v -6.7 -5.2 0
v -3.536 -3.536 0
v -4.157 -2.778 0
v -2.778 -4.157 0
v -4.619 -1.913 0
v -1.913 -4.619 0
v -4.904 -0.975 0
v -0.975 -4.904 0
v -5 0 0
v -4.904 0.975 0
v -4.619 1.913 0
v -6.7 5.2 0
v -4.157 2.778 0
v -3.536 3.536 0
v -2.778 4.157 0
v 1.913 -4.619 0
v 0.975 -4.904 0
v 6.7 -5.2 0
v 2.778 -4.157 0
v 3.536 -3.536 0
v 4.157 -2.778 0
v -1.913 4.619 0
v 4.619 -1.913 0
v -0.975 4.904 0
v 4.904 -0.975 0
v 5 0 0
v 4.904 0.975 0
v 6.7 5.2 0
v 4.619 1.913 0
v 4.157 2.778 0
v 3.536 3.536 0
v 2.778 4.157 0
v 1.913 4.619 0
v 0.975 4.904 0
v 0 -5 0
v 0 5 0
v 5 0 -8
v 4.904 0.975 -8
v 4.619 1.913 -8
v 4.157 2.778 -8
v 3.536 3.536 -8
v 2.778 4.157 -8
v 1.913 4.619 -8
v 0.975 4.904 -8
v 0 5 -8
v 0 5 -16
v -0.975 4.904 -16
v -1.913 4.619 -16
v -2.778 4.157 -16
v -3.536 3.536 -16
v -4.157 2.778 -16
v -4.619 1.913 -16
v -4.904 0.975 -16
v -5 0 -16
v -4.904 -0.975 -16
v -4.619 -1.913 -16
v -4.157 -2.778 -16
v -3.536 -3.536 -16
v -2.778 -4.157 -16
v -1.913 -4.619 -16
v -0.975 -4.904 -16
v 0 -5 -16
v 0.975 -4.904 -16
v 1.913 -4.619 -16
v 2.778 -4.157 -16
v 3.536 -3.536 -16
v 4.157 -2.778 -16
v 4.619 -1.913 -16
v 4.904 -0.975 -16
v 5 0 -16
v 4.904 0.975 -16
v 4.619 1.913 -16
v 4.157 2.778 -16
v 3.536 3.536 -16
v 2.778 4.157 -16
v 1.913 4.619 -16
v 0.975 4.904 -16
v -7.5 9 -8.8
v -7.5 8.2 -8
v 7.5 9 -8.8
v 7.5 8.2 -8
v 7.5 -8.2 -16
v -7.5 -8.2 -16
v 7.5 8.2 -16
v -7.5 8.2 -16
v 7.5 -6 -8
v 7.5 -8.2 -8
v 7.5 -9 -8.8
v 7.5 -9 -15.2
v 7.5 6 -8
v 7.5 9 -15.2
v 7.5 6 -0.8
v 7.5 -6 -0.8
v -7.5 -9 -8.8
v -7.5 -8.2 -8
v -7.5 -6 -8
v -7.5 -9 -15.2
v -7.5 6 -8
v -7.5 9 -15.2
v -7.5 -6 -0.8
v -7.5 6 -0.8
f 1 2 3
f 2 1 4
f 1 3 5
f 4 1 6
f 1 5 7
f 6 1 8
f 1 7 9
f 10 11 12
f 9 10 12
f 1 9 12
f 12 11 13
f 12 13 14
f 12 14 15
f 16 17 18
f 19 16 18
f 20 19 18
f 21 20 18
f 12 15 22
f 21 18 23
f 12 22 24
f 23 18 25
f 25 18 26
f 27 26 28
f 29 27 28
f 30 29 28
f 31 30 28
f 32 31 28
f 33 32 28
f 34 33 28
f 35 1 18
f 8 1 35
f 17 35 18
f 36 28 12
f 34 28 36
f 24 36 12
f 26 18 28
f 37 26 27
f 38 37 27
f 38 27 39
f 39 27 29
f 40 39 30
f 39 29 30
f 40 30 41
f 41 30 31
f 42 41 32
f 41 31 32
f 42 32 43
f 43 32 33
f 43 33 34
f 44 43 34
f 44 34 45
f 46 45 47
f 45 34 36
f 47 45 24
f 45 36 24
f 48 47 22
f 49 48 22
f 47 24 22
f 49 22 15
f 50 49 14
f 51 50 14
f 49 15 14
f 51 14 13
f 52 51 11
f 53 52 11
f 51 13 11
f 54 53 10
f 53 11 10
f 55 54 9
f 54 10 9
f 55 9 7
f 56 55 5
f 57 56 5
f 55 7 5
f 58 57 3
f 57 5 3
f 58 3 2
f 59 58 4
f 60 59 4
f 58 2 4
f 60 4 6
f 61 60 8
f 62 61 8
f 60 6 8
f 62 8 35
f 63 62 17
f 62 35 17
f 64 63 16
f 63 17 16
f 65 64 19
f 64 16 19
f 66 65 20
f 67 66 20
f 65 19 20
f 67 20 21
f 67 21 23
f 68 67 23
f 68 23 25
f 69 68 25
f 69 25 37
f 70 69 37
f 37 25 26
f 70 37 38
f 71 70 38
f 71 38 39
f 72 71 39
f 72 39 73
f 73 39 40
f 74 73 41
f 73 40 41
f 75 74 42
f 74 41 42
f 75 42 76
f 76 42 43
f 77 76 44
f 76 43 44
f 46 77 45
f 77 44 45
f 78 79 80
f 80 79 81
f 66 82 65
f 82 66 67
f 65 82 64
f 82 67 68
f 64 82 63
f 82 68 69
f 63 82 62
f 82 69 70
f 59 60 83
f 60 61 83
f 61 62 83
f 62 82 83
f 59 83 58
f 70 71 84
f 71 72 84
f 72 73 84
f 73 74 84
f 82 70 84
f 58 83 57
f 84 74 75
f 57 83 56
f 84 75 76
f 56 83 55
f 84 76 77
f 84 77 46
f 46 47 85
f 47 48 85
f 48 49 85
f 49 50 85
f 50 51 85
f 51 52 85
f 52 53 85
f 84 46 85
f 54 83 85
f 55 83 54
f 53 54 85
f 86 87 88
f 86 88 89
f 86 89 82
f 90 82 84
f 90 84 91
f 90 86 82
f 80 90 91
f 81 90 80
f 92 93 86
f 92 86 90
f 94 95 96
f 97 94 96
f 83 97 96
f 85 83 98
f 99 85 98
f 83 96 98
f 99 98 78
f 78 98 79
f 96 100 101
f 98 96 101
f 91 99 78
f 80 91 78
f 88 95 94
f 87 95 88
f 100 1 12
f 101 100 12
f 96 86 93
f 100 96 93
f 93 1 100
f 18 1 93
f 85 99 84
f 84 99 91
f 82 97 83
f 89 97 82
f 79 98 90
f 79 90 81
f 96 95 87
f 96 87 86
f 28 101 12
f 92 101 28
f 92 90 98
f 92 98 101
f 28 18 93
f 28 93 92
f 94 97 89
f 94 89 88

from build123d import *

# Parameters (mm, degrees)
SALIENTE_EXTRUIR1_START     = -14.8
SALIENTE_EXTRUIR1_OUTLINE_W = 17.2
SALIENTE_EXTRUIR1_OUTLINE_H = 14
SALIENTE_EXTRUIR1_DEPTH     = 15.6
CROQUIS2_W                  = 14
CROQUIS2_H                  = 14.8
SALIENTE_EXTRUIR2_DEPTH     = 0.8
CROQUIS3_W                  = 18
CROQUIS3_H                  = 7
SALIENTE_EXTRUIR3_DEPTH     = 3.2
CROQUIS4_W                  = 8
CROQUIS4_H                  = 3
CORTAR_EXTRUIR1_DEPTH       = 25.515301344
TALADRO1_D                  = 10
CHAFL_N1_SIZE               = 0.7
CROQUIS7_W                  = 7
CROQUIS7_H                  = 3.2
CORTAR_EXTRUIR2_DEPTH       = 23.6
CROQUIS8_W                  = 8
CROQUIS8_H                  = 0.599553283
SALIENTE_EXTRUIR4_DEPTH     = 18
CROQUIS9_W                  = 8
CROQUIS9_H                  = 3
CORTAR_EXTRUIR3_DEPTH       = 23.3
CROQUIS10_W                 = 8
CROQUIS10_H                 = 18
SALIENTE_EXTRUIR5_DEPTH     = 18
CROQUIS11_OUTSIDE_W         = 26.014
CROQUIS11_OUTSIDE_H         = 26.014
CROQUIS11_OUTSIDE_W_2       = 15
CROQUIS11_OUTSIDE_H_2       = 18
CORTAR_EXTRUIR4_DEPTH       = 30.1
CHAFL_N3_SIZE               = 0.8
CROQUIS12_R                 = 5
CORTAR_EXTRUIR5_DEPTH       = 30.1


with BuildPart() as part:
    # Saliente-Extruir1: read off the stored shape, not the designer's step
    # Saliente-Extruir1 outline → Saliente-Extruir1 (new body)
    with BuildSketch(Plane.XZ.offset(5.8).offset(SALIENTE_EXTRUIR1_START)):
        with Locations((0.4, -7)):
            Rectangle(SALIENTE_EXTRUIR1_OUTLINE_W, SALIENTE_EXTRUIR1_OUTLINE_H)
    extrude(amount=SALIENTE_EXTRUIR1_DEPTH)

    # Saliente-Extruir1 2 outline → Saliente-Extruir1 2 (revolve, cut)
    with BuildSketch(Plane(origin=(-7.4, 0, -3.5), x_dir=(1, 0, 0), z_dir=(0, 0, 1))):
        with BuildLine():
            Line((19.473315075, -5.8), (0.8, -5.799999999))
            ThreePointArc((0.8, -5.799999999), (0.565685425, -6.365685425), (0, -6.6))
            Line((0, -6.6), (19.473315075, -6.6))
            Line((19.473315075, -6.6), (19.473315075, -5.8))
        make_face()
    revolve(axis=Axis((-7.4, 0, -3.5), (0, 1, 0)), mode=Mode.SUBTRACT)

    # Croquis2 → Saliente-Extruir2 (add)
    with BuildSketch(Plane.ZY.offset(8.2)):
        with Locations((-7, 1.6)):
            Rectangle(CROQUIS2_W, CROQUIS2_H)
    extrude(amount=SALIENTE_EXTRUIR2_DEPTH)

    # Croquis3 → Saliente-Extruir3 (add)
    with BuildSketch(Plane.XZ.offset(5.8)):
        with Locations((0, -10.5)):
            Rectangle(CROQUIS3_W, CROQUIS3_H)
    extrude(amount=SALIENTE_EXTRUIR3_DEPTH)

    # Croquis4 → Cortar-Extruir1 (cut, through all)
    with BuildSketch(Plane.ZY.offset(9)):
        with Locations((-4, 7.5)):
            Rectangle(CROQUIS4_W, CROQUIS4_H)
    extrude(amount=-CORTAR_EXTRUIR1_DEPTH, mode=Mode.SUBTRACT)

    # Taladro1 (through all)
    with Locations(Plane(origin=(0, 0, -14), x_dir=(-1, 0, 0), z_dir=(0, 0, -1))):
        with Locations((0, 0)):
            Hole(TALADRO1_D / 2)

    # Chaflán1
    chafl_n1_edges = [part.edges().sort_by_distance(p)[0] for p in [
        (0, 9, -14),
        (0, -9, -14),
    ]]
    chamfer(chafl_n1_edges, length=CHAFL_N1_SIZE)

    # Croquis7 → Cortar-Extruir2 (cut)
    with BuildSketch(Plane(origin=(9, 0, 0), x_dir=(0, 0, -1), z_dir=(1, 0, 0))):
        with Locations((3.5, -7.4)):
            Rectangle(CROQUIS7_W, CROQUIS7_H)
    extrude(amount=-CORTAR_EXTRUIR2_DEPTH, mode=Mode.SUBTRACT)

    # Croquis8 → Saliente-Extruir4 (add)
    with BuildSketch(Plane.ZY.offset(9)):
        with Locations((-4, -5.700223359)):
            Rectangle(CROQUIS8_W, CROQUIS8_H)
    extrude(amount=-SALIENTE_EXTRUIR4_DEPTH)

    # Croquis9 → Cortar-Extruir3 (cut)
    with BuildSketch(Plane.ZY.offset(9)):
        with Locations((-4, -7.5)):
            Rectangle(CROQUIS9_W, CROQUIS9_H)
    extrude(amount=-CORTAR_EXTRUIR3_DEPTH, mode=Mode.SUBTRACT)

    # Croquis10 → Saliente-Extruir5 (add)
    with BuildSketch(Plane.ZY.offset(9)):
        with Locations((-12, 0)):
            Rectangle(CROQUIS10_W, CROQUIS10_H)
    extrude(amount=-SALIENTE_EXTRUIR5_DEPTH)

    # Croquis11 outside → Cortar-Extruir4 (cut)
    with BuildSketch(Plane.XY):
        Rectangle(CROQUIS11_OUTSIDE_W, CROQUIS11_OUTSIDE_H)
        Rectangle(CROQUIS11_OUTSIDE_W_2, CROQUIS11_OUTSIDE_H_2, mode=Mode.SUBTRACT)
    extrude(amount=-CORTAR_EXTRUIR4_DEPTH, mode=Mode.SUBTRACT)

    # Chaflán3
    chafl_n3_edges = [part.edges().sort_by_distance(p)[0] for p in [
        (0, 9, -16),
        (0, -9, -16),
        (0, -9, -8),
        (0, -6, 0),
        (0, 9, -8),
        (0, 6, 0),
        (-7.5, 0, 0),
        (7.5, 0, 0),
    ]]
    chamfer(chafl_n3_edges, length=CHAFL_N3_SIZE)

    # Croquis12 → Cortar-Extruir5 (cut)
    with BuildSketch(Plane.XY.offset(-8)):
        with Locations(Location((0, 0, 0), (0, 0, 90))):
            Circle(CROQUIS12_R)
    extrude(amount=-CORTAR_EXTRUIR5_DEPTH, mode=Mode.SUBTRACT)


solid = part.part
